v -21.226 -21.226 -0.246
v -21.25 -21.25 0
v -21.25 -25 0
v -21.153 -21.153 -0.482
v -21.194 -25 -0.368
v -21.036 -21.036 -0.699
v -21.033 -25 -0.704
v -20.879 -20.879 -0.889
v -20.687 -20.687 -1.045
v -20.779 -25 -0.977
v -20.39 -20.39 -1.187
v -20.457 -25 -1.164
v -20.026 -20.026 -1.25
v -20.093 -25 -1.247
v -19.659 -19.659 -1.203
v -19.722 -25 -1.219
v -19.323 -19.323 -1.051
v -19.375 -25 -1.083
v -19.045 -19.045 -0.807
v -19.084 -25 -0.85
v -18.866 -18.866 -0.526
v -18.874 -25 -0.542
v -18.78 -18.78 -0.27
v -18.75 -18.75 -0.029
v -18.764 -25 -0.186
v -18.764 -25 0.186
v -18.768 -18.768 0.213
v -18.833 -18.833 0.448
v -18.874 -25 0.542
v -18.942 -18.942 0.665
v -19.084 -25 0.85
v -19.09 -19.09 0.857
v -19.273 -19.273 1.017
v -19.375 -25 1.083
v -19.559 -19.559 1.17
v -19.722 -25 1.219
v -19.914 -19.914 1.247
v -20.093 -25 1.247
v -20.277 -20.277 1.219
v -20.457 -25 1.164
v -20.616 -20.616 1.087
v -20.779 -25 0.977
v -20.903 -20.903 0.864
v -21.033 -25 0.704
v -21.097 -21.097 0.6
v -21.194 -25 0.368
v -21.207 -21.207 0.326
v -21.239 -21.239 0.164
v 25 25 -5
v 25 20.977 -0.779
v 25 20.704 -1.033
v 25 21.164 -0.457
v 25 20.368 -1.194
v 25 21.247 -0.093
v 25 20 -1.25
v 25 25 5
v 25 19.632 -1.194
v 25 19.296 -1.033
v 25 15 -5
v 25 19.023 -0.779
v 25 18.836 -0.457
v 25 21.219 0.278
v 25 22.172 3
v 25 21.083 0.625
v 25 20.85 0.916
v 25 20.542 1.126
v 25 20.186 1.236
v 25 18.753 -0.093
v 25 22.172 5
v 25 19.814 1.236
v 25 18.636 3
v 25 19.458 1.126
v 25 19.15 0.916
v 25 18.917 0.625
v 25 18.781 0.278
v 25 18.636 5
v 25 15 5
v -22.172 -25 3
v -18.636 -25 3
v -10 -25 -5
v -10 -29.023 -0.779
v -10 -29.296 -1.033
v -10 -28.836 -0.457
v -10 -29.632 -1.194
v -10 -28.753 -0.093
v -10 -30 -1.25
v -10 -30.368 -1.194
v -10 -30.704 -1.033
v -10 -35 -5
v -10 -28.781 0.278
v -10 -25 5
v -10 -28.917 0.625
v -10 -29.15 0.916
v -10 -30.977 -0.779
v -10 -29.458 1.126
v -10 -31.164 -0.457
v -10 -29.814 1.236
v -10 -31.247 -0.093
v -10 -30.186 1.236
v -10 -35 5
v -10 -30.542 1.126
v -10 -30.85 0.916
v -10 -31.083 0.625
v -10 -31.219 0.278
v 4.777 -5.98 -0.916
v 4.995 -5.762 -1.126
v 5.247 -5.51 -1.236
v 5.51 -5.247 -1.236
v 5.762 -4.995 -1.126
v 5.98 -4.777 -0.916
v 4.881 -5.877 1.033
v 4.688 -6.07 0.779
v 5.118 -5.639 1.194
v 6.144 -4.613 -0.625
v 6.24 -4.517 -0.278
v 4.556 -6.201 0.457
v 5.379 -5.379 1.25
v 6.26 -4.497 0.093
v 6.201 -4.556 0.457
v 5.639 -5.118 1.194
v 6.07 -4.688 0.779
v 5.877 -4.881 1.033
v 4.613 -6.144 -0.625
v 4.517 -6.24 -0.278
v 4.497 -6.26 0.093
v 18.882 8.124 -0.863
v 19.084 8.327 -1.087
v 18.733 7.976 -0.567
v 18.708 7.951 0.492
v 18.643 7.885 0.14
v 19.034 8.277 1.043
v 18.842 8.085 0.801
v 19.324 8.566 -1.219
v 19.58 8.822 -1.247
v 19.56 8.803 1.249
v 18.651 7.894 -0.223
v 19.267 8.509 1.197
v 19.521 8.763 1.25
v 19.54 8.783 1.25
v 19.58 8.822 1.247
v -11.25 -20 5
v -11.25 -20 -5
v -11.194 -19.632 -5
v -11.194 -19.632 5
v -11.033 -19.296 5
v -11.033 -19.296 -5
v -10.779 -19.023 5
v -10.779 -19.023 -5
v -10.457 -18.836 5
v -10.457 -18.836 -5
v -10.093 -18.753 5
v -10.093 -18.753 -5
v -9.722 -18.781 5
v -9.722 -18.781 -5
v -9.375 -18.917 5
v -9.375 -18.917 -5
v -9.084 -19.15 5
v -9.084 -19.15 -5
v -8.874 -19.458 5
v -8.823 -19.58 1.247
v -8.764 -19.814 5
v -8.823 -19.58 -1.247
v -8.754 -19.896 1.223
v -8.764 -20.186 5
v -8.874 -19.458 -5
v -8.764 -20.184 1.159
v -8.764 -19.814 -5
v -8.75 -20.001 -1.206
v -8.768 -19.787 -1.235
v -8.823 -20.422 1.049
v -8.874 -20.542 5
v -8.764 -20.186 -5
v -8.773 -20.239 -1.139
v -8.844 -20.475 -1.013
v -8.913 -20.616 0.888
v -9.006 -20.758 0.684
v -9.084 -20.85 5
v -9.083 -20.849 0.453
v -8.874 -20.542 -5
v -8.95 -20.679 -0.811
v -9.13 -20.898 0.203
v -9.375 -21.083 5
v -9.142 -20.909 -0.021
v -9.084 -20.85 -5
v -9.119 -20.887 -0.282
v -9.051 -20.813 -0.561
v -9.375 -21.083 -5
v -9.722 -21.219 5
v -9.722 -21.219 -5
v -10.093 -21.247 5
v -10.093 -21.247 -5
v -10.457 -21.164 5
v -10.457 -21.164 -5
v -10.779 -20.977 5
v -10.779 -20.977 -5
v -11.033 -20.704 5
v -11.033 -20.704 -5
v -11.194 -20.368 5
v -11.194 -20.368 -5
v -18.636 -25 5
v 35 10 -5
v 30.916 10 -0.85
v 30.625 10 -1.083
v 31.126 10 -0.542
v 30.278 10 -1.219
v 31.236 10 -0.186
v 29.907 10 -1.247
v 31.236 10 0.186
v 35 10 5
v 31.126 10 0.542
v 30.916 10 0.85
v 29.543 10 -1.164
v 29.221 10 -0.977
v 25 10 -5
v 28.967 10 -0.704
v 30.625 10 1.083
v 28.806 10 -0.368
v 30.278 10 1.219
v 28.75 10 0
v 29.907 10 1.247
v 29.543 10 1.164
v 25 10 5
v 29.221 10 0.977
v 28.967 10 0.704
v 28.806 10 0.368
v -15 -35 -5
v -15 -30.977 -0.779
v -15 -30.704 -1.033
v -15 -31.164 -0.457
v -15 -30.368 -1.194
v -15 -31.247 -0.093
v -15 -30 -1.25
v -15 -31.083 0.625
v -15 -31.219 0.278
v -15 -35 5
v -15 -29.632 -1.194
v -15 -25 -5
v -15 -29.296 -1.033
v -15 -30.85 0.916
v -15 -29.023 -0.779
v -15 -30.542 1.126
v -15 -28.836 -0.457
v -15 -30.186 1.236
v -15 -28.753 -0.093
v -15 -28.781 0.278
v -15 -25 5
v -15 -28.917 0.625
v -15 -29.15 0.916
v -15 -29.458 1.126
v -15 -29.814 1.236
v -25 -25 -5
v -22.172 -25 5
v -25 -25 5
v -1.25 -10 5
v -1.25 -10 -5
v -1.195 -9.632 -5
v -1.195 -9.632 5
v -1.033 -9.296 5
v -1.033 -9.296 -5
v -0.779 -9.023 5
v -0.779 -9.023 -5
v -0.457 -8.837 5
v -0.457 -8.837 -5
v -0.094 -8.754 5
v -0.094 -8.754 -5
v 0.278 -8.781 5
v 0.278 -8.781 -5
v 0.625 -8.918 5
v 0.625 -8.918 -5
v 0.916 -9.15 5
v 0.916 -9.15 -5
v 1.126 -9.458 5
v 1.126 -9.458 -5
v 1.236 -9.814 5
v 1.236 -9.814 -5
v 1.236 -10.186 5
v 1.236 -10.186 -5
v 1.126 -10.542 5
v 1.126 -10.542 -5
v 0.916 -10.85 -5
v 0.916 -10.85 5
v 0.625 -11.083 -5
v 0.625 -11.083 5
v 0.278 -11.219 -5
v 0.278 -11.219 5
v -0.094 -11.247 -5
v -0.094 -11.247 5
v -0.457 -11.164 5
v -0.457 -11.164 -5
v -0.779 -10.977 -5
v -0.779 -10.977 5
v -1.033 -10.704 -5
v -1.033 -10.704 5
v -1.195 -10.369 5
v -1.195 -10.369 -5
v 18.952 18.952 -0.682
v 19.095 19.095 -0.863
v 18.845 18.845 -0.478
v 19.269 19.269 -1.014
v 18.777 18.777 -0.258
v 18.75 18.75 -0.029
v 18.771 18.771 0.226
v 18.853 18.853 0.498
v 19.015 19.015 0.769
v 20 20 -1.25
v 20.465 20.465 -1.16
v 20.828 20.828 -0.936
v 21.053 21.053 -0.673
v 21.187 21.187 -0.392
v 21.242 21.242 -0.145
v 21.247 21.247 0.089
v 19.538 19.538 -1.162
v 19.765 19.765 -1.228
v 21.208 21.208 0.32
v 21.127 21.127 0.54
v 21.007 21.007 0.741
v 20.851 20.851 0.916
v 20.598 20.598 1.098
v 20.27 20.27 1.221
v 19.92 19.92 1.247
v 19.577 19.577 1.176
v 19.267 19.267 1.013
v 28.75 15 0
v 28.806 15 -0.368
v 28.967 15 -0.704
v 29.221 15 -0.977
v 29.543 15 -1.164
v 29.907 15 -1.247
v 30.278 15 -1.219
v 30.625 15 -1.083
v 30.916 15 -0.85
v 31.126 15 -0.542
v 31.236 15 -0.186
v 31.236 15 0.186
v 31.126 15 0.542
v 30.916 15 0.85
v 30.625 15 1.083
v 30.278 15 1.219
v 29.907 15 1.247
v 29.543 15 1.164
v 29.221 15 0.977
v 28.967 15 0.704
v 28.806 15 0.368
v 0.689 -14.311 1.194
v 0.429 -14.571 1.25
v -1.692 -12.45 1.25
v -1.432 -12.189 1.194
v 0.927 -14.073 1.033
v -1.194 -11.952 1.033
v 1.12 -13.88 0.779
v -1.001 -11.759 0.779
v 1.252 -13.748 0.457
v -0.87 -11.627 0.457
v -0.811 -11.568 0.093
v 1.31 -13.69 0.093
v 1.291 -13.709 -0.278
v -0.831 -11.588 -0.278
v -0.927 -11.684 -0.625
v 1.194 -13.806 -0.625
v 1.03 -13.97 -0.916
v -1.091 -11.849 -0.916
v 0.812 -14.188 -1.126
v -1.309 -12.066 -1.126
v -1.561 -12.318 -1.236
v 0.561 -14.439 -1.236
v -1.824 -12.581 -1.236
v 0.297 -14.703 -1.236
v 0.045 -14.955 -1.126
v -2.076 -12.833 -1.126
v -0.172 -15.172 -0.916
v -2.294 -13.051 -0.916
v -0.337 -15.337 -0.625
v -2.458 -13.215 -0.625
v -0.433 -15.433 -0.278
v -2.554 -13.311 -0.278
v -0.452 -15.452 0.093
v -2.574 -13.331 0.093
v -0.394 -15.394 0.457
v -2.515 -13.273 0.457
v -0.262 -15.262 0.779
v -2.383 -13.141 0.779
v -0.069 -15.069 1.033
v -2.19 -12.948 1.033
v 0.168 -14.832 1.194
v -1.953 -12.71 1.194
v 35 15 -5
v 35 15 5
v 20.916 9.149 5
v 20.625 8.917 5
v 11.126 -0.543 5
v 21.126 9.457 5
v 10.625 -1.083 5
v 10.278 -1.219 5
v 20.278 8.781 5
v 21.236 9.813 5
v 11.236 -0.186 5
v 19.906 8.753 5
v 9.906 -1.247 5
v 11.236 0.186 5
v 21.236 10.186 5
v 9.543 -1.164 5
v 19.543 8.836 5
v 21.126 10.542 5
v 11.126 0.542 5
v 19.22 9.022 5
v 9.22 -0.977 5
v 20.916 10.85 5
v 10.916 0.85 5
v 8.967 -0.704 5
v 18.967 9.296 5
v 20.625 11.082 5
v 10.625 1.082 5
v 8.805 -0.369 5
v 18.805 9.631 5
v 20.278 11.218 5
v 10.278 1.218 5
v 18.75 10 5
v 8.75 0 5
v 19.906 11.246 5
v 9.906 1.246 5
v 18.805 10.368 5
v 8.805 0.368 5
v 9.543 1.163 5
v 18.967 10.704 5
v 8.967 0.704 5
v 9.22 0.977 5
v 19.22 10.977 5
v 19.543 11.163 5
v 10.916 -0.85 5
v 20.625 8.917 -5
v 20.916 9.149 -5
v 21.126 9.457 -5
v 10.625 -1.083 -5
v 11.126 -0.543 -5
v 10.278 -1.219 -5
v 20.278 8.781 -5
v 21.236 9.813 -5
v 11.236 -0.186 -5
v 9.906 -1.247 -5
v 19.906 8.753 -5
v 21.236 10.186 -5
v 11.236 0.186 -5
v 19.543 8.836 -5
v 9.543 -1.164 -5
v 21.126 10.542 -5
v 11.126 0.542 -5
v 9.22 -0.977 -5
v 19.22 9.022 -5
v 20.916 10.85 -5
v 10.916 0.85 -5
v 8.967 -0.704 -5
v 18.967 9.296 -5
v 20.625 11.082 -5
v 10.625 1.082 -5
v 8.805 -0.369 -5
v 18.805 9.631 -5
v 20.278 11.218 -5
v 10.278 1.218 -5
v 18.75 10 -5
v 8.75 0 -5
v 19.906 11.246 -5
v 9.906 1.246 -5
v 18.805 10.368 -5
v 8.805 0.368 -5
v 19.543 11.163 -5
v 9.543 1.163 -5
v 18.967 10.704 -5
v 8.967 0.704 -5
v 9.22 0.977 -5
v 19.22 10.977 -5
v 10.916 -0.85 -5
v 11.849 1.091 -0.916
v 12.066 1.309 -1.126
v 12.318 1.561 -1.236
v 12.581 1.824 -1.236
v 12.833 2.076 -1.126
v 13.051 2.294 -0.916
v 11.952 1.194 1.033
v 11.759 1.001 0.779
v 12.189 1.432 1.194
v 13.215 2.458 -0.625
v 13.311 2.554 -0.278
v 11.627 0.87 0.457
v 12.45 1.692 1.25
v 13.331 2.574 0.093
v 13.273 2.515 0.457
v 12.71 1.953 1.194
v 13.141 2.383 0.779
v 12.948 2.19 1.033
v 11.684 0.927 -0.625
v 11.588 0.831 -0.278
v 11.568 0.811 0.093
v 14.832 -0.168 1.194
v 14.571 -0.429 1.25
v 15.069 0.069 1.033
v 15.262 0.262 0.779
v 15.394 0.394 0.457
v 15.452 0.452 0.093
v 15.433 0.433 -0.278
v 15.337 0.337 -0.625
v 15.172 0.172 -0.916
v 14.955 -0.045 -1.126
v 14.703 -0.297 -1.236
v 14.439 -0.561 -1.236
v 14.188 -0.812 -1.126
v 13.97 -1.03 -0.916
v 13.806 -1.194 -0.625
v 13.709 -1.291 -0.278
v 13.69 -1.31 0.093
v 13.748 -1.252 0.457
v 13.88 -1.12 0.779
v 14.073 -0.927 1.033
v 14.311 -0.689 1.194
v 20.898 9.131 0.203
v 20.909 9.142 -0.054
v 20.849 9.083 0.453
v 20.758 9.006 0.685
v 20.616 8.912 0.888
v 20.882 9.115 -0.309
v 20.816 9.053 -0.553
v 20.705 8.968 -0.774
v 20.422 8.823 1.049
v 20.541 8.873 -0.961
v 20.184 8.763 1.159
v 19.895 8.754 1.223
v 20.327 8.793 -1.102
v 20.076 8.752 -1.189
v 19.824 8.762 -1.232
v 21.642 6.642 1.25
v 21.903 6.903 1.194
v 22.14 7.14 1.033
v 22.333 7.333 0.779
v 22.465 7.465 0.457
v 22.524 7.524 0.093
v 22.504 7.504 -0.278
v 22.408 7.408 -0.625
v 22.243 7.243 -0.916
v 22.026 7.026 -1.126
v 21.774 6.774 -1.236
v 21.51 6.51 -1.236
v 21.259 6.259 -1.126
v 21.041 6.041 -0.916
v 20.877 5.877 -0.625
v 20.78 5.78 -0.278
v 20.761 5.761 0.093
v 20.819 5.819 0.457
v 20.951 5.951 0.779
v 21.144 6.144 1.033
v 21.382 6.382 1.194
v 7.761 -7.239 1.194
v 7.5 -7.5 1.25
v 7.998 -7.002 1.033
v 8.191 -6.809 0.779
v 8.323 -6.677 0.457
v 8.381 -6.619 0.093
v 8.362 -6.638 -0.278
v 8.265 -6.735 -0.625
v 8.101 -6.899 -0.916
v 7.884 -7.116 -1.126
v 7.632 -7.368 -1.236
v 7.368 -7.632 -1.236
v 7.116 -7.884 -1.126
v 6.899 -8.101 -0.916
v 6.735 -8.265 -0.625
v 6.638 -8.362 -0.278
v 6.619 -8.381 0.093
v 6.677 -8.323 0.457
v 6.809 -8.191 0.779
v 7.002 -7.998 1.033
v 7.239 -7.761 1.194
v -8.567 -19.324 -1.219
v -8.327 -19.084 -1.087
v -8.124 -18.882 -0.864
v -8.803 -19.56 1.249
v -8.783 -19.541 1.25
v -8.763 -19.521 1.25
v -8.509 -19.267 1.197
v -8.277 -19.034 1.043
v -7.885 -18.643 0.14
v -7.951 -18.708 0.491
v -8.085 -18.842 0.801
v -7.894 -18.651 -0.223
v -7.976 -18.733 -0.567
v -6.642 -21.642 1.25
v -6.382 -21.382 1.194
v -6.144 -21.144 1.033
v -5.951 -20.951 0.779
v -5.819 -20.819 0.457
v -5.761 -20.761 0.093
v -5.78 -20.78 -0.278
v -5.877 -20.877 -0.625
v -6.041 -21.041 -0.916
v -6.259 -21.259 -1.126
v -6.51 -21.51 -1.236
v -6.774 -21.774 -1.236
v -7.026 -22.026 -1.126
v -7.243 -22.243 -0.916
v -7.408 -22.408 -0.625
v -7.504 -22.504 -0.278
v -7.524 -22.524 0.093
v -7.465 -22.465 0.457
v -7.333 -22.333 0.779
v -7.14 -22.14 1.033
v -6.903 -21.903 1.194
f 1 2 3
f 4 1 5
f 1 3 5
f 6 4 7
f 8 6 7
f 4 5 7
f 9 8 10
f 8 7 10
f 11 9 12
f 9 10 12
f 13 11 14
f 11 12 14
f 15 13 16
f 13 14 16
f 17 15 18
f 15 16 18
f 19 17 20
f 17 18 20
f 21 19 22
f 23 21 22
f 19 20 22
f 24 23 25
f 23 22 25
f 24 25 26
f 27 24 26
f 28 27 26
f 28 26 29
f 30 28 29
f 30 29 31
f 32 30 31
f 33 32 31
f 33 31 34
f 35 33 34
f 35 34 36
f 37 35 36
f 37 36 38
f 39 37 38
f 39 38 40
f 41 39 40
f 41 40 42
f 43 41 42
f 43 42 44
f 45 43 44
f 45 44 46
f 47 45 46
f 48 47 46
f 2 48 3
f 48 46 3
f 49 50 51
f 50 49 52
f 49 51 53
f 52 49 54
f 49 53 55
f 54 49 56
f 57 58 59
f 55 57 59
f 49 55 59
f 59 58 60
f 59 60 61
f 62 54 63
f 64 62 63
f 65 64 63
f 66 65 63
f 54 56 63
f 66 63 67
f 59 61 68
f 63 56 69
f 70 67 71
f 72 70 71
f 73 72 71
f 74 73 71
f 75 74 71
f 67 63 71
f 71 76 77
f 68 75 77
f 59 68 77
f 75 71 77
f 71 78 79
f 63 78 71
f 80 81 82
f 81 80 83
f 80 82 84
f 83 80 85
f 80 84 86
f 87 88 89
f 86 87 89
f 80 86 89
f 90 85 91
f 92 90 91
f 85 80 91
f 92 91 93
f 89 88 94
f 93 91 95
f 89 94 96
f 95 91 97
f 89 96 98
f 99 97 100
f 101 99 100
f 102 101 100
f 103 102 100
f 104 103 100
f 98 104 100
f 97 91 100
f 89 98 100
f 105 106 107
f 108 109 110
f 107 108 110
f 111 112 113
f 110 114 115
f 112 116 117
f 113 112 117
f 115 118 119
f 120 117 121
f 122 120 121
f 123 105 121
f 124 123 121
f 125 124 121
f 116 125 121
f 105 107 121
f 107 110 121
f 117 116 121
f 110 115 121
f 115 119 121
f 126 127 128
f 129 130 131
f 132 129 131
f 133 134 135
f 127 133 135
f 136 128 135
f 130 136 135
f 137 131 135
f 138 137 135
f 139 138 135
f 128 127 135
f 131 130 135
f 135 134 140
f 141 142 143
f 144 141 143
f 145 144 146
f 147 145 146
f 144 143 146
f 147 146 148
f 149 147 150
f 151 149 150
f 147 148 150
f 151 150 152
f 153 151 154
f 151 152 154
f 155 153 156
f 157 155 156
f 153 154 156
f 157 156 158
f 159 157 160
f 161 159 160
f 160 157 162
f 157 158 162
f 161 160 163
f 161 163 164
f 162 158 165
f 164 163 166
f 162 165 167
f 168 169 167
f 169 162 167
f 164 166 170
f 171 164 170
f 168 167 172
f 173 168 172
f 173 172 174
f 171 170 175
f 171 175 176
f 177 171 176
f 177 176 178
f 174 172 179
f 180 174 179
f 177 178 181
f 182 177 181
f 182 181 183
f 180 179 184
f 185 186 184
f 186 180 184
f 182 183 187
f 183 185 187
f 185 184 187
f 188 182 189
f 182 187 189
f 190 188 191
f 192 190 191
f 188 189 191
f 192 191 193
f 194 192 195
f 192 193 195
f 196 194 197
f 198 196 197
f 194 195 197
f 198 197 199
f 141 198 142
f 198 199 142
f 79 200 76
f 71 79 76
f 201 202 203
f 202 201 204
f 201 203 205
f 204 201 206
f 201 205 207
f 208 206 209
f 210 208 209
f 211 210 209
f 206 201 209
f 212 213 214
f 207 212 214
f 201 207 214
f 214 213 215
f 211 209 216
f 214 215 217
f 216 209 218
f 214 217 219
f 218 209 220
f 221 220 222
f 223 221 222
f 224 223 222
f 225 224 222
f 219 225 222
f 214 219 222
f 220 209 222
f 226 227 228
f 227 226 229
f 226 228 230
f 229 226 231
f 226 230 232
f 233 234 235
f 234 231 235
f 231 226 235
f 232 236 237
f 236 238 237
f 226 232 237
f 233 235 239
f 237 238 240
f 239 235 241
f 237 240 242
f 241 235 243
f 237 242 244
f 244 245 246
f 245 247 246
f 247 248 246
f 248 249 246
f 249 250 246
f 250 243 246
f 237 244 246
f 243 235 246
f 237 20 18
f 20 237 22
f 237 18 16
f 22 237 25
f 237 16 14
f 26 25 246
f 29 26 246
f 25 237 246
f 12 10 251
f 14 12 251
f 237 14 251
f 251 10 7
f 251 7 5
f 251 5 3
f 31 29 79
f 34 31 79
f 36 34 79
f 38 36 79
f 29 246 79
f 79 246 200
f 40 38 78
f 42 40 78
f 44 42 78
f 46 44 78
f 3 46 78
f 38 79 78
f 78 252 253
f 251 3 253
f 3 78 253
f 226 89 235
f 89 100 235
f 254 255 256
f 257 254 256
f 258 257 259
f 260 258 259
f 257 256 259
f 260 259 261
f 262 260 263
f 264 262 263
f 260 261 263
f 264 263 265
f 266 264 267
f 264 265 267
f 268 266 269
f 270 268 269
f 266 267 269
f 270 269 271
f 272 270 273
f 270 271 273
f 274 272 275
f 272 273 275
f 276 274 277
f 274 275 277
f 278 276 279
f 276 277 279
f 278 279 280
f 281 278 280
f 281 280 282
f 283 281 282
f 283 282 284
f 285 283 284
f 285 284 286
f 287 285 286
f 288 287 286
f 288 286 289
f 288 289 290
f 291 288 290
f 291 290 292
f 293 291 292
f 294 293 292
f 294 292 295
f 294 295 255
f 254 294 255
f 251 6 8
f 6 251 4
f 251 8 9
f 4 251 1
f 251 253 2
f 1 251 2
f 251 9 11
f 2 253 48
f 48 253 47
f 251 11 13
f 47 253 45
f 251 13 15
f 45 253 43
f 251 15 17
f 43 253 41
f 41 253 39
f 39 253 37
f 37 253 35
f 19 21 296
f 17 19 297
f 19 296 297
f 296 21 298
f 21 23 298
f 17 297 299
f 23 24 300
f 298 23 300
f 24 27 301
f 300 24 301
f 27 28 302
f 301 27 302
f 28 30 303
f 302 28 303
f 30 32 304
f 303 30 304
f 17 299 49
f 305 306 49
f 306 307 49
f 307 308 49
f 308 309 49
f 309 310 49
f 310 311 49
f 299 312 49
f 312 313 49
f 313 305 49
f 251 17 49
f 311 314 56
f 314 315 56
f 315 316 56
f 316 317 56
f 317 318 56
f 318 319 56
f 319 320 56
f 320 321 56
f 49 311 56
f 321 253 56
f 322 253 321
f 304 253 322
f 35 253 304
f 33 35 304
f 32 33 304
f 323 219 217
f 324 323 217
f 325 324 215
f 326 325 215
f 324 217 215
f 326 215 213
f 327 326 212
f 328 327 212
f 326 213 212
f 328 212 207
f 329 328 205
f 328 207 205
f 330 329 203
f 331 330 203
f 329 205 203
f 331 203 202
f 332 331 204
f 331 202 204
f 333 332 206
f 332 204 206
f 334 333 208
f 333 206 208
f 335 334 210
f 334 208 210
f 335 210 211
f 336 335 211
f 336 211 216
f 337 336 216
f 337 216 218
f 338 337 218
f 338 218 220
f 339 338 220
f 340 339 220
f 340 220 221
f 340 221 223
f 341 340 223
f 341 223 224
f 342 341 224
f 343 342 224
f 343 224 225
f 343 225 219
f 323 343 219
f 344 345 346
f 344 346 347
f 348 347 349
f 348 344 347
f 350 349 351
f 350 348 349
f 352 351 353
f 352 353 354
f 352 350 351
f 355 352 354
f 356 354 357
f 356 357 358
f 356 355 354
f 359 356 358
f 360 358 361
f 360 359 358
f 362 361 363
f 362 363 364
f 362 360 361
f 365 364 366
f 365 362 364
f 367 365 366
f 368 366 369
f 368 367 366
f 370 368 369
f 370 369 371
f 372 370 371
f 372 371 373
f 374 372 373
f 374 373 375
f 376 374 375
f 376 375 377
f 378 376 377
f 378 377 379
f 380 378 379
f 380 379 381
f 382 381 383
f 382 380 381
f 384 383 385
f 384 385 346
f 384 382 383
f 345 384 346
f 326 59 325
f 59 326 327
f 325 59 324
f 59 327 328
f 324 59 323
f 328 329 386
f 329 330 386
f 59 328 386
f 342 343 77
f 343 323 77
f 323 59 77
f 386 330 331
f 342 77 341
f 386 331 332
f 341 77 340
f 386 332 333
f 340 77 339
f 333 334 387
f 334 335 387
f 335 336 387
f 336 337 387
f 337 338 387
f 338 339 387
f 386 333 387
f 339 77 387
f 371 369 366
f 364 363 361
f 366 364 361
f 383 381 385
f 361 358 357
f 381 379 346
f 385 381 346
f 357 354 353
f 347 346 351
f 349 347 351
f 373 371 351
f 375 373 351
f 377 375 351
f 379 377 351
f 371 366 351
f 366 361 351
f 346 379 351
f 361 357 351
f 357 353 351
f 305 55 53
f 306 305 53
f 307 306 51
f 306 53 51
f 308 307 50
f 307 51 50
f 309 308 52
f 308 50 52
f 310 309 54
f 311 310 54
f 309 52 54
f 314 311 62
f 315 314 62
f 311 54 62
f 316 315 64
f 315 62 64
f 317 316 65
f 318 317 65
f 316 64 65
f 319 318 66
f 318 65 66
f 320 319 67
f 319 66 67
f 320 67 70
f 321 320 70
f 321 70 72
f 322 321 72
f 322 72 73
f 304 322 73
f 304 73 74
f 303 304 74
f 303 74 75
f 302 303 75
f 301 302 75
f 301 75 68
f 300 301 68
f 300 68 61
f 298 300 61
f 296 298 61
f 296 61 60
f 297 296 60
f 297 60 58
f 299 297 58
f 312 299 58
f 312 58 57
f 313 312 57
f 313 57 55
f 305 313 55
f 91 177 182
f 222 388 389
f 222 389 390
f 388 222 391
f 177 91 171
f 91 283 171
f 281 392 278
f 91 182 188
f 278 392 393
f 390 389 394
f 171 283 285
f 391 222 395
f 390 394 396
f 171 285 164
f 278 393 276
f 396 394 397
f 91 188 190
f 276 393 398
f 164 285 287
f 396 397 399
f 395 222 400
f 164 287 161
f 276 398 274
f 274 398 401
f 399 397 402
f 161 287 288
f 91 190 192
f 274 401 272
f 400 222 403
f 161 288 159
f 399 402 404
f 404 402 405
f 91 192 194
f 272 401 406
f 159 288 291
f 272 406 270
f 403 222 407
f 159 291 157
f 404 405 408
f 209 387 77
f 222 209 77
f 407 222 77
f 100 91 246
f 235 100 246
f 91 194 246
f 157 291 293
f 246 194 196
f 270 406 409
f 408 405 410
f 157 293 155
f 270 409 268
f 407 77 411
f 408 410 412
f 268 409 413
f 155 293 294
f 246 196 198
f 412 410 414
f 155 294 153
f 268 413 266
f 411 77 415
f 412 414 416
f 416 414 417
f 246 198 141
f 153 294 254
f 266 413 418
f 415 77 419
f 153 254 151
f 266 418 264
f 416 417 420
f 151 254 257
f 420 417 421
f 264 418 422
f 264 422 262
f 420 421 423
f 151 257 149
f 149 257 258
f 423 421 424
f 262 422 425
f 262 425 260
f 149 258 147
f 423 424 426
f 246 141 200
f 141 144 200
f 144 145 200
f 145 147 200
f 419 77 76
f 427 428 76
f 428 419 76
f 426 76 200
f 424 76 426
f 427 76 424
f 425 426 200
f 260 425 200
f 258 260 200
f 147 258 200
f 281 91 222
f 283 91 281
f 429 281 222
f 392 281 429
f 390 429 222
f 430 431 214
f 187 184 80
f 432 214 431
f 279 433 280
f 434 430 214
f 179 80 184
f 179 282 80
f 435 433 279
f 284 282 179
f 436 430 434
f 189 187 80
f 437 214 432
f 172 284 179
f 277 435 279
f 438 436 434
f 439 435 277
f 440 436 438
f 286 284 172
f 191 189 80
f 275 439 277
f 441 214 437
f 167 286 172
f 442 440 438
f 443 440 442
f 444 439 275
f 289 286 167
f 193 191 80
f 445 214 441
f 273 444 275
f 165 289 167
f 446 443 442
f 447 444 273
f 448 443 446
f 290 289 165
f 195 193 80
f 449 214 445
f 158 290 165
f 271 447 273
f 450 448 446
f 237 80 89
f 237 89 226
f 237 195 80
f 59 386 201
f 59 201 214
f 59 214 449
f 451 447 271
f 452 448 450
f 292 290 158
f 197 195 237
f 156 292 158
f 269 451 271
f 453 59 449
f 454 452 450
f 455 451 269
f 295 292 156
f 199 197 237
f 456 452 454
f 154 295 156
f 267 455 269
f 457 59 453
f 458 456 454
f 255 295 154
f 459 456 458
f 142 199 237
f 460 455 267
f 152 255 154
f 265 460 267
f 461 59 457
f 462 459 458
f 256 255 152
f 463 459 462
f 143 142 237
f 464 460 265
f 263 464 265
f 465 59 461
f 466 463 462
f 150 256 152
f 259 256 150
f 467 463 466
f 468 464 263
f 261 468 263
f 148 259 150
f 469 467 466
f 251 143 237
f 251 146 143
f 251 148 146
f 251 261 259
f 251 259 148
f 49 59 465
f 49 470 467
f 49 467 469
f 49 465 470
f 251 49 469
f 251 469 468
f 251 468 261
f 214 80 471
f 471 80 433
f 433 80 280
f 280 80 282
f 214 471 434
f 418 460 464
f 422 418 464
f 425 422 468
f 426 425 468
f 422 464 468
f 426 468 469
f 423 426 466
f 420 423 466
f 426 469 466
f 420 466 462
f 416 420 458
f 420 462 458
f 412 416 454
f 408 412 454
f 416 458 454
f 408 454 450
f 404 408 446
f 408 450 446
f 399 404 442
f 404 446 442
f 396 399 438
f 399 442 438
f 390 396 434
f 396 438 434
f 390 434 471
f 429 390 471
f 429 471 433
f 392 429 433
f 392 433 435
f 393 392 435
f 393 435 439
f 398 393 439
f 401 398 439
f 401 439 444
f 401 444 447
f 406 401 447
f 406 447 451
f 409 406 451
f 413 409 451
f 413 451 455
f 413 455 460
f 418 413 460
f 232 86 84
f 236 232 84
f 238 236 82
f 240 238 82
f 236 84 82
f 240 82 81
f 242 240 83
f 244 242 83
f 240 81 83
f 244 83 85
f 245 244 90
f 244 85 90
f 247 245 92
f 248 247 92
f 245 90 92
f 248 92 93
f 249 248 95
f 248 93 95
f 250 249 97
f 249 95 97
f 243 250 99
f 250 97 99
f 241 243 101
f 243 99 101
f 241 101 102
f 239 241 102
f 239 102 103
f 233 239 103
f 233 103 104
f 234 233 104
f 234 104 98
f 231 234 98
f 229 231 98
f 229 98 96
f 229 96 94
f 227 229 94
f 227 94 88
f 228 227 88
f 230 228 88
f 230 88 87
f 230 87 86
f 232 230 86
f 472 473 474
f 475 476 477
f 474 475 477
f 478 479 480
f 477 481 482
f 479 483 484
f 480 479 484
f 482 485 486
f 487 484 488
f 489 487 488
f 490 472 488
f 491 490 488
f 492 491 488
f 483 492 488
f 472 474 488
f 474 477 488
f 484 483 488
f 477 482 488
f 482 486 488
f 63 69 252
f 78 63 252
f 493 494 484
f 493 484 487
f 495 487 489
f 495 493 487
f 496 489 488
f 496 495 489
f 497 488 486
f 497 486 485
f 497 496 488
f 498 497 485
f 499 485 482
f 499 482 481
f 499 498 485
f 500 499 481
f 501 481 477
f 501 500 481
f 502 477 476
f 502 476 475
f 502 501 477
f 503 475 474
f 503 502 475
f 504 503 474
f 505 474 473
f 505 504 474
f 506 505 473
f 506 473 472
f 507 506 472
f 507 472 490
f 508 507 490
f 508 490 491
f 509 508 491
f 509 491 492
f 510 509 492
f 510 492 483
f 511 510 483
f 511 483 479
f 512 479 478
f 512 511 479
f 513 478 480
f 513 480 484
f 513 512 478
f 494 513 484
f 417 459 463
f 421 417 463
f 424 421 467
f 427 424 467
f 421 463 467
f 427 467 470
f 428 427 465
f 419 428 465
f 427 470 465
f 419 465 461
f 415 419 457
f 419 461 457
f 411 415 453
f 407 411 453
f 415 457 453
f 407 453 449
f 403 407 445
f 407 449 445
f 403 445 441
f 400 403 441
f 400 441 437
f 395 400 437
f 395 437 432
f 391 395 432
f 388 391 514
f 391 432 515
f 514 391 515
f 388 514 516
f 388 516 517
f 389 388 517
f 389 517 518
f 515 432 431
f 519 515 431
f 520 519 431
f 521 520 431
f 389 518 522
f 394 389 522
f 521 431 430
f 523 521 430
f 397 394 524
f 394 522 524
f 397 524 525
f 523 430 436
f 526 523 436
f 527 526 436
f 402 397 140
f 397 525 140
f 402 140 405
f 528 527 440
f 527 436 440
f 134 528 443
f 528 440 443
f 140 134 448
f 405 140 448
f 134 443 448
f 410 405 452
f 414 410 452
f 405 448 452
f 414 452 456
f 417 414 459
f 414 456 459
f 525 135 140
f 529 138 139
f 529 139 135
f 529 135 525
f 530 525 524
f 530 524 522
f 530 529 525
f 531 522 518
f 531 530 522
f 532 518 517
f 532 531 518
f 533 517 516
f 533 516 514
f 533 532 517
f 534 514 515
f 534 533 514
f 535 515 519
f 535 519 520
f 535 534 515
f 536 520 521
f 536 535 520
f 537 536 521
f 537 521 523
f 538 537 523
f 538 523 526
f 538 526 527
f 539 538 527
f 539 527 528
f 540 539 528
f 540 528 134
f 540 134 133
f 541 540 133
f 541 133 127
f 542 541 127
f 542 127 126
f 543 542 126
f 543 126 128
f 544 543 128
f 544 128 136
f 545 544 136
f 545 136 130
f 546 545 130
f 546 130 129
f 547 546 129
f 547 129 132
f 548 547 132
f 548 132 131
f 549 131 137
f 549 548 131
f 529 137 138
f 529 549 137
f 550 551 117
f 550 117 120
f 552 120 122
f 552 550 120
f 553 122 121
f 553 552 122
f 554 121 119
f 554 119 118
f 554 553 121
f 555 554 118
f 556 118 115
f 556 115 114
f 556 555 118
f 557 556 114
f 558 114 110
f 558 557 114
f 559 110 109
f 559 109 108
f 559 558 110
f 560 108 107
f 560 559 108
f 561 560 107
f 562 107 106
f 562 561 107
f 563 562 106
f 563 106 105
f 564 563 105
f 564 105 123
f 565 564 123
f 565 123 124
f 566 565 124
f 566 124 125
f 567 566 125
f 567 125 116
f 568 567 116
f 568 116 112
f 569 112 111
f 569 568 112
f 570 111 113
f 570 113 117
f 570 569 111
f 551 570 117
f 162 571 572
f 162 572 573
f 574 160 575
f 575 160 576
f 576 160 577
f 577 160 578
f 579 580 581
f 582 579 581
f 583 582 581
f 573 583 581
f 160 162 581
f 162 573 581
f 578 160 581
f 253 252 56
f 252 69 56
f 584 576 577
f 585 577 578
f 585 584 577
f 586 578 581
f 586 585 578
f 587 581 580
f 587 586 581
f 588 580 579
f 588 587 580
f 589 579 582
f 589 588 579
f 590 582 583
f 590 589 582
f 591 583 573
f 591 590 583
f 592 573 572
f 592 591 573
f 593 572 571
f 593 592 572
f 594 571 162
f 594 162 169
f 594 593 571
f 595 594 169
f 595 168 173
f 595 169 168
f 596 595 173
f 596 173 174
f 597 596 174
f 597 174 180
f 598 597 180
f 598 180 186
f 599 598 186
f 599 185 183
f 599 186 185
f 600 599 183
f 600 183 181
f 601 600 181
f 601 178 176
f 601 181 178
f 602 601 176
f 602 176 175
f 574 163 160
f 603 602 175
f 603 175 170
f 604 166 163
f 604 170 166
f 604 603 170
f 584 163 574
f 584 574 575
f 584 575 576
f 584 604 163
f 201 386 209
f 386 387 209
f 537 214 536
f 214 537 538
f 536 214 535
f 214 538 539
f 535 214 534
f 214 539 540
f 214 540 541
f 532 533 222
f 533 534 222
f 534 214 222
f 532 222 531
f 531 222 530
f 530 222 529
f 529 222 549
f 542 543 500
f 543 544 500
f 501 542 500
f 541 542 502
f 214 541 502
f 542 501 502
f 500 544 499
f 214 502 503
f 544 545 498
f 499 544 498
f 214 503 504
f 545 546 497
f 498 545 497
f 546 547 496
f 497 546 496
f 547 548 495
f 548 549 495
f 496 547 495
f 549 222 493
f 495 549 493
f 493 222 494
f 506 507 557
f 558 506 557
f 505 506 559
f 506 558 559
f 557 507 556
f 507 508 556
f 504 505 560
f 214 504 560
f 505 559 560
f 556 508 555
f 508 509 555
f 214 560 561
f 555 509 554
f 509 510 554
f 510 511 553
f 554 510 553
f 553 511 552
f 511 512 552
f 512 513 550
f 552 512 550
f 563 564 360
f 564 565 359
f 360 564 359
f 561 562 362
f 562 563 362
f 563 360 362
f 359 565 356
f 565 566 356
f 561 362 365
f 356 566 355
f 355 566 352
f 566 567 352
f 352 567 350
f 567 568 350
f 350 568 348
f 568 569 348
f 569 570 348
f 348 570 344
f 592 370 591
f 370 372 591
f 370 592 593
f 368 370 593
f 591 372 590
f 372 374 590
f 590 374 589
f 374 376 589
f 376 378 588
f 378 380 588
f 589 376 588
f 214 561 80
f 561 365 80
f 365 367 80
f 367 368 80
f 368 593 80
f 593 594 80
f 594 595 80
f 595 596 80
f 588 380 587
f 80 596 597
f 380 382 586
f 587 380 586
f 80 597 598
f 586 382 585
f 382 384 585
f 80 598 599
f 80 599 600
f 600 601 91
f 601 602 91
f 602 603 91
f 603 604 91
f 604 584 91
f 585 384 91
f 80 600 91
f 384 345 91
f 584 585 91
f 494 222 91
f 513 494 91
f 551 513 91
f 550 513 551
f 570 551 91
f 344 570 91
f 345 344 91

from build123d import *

# Parameters (mm, degrees)
MAIN_DEPTH         = 5
SKETCH2_R          = 1.25
FIXHOLE1_DEPTH     = 51
SKETCH3_R          = 1.25
FIXHOLE2_DEPTH     = 51
WINDOWSLOT1_DEPTH  = 2
SKETCH6_R          = 1.25
CUT_EXTRUDE2_DEPTH = 3
LPATTERN1_COUNT    = 5
LPATTERN1_PITCH    = 10
SKETCH7_R          = 1.25
CUT_EXTRUDE3_DEPTH = 11
LPATTERN2_COUNT    = 4
LPATTERN2_PITCH    = 14.142


with BuildPart() as part:
    # Sketch1 → Main (new body, symmetric)
    with BuildSketch(Plane.XY):
        Polygon((-25, -25), (25, 25), (25, 15), (35, 15), (35, 10), (25, 10), (-10, -25), (-10, -35), (-15, -35), (-15, -25), align=None)
    extrude(amount=MAIN_DEPTH, both=True)

    # Sketch2 → FixHole1 (cut, through all)
    with BuildSketch(Plane(origin=(25, 0, 0), x_dir=(0, 0, -1), z_dir=(1, 0, 0))):
        with Locations((0, -30)):
            Circle(SKETCH2_R)
        with Locations((0, 20)):
            Circle(SKETCH2_R)
    extrude(amount=-FIXHOLE1_DEPTH, mode=Mode.SUBTRACT)

    # Sketch3 → FixHole2 (cut, through all)
    with BuildSketch(Plane(origin=(0, -25, 0), x_dir=(-1, 0, 0), z_dir=(0, -1, 0))):
        with Locations((20, 0)):
            Circle(SKETCH3_R)
        with Locations((-30, 0)):
            Circle(SKETCH3_R)
    extrude(amount=-FIXHOLE2_DEPTH, mode=Mode.SUBTRACT)

    # Sketch4 → WindowSlot1 (cut)
    with BuildSketch(Plane.XY.offset(5)):
        Polygon((25, 22.171572875), (-22.171572875, -25), (-18.636038969, -25), (25, 18.636038969), align=None)
    extrude(amount=-WINDOWSLOT1_DEPTH, mode=Mode.SUBTRACT)

    # Sketch6 → Cut-Extrude2 (cut)
    with BuildSketch(Plane(origin=(7.5, -7.5, 0), x_dir=(0, 0, 1), z_dir=(-0.707106781, 0.707106781, 0))):
        with Locations((0, 20)):
            Circle(SKETCH6_R)
    cut_extrude2 = extrude(amount=CUT_EXTRUDE2_DEPTH, mode=Mode.SUBTRACT)

    # LPattern1: Cut-Extrude2 ×5
    with Locations(*[Vector(-0.707106781, -0.707106781, 0) * (i * LPATTERN1_PITCH) for i in range(1, LPATTERN1_COUNT)]):
        add(cut_extrude2, mode=Mode.SUBTRACT)

    # Sketch7 → Cut-Extrude3 (cut, through all)
    with BuildSketch(Plane(origin=(0, 0, -5), x_dir=(-1, 0, 0), z_dir=(0, 0, -1))):
        with Locations((10, -20)):
            Circle(SKETCH7_R)
    cut_extrude3 = extrude(amount=-CUT_EXTRUDE3_DEPTH, mode=Mode.SUBTRACT)

    # LPattern2: Cut-Extrude3 ×4
    with Locations(*[Vector(0.707106781, 0.707106781, 0) * (i * LPATTERN2_PITCH) for i in range(1, LPATTERN2_COUNT)]):
        add(cut_extrude3, mode=Mode.SUBTRACT)


solid = part.part
